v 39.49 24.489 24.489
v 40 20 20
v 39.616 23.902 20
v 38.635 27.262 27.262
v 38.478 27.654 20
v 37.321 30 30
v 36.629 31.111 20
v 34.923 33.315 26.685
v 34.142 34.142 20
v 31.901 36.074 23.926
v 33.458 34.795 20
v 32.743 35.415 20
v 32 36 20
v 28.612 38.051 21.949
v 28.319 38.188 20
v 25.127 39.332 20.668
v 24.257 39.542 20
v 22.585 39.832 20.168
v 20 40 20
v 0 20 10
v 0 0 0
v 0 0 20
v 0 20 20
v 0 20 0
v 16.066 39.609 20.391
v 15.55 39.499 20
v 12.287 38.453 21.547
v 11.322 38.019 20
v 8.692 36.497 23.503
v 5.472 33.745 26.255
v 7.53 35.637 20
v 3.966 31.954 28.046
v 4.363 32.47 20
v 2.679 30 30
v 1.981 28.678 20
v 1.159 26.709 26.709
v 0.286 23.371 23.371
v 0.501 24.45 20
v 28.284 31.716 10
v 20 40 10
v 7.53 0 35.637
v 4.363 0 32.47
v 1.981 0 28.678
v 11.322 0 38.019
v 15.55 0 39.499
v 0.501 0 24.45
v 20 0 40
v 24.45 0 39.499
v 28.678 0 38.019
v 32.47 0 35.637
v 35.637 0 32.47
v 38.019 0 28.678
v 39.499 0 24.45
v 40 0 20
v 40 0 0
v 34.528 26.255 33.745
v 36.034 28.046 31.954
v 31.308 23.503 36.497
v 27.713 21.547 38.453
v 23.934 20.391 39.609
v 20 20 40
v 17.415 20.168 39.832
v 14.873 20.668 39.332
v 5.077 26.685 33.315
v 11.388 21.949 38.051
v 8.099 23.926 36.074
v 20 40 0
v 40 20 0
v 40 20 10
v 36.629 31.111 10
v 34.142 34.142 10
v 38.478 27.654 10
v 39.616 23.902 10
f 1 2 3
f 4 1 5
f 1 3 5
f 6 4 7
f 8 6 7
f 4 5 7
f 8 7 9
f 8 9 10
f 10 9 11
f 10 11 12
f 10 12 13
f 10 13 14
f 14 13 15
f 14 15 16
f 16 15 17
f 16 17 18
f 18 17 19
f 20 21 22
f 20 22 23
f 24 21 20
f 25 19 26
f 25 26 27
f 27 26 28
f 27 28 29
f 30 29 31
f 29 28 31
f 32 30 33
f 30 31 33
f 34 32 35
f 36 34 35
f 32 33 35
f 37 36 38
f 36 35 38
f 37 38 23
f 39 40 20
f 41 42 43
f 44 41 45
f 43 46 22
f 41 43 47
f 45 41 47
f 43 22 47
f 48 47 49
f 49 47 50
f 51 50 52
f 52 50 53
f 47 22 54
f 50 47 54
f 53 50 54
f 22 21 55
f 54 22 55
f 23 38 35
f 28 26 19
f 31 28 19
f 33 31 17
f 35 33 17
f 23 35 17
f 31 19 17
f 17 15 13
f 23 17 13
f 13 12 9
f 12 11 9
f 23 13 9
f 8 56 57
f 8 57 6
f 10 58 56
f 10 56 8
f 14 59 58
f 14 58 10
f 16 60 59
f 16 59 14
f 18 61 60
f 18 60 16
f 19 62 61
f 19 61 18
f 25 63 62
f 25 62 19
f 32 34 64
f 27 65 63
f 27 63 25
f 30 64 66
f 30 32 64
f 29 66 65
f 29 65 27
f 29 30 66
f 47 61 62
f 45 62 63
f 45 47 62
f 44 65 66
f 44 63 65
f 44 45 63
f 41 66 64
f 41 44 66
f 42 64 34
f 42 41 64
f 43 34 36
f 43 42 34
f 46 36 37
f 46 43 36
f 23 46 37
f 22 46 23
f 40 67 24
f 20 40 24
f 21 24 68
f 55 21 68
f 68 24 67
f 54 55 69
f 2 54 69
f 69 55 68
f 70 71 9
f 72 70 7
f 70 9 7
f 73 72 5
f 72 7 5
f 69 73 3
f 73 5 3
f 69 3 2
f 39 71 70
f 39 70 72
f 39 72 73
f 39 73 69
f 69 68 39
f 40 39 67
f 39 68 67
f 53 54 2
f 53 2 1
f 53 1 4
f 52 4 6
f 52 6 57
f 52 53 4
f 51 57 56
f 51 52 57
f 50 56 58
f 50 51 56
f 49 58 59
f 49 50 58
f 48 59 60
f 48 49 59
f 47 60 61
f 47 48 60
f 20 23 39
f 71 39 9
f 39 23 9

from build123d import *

# Parameters (mm, degrees)
SKETCH1_W           = 40
SKETCH1_H           = 20
BOSS_EXTRUDE1_DEPTH = 40
CUT_EXTRUDE1_DEPTH  = 40
CUT_EXTRUDE2_DEPTH  = 40
CUT_EXTRUDE3_DEPTH  = 10
CUT_EXTRUDE4_DEPTH  = 10
BOSS_EXTRUDE2_DEPTH = 10


with BuildPart() as part:
    # Sketch1 → Boss-Extrude1 (new body)
    with BuildSketch(Plane.XY):
        with BuildLine():
            Line((0, 20), (40, 20))
            ThreePointArc((40, 20), (20, 40), (0, 20))
        make_face()
        with Locations((20, 10)):
            Rectangle(SKETCH1_W, SKETCH1_H)
    extrude(amount=BOSS_EXTRUDE1_DEPTH)

    # Sketch2 → Cut-Extrude1 (cut)
    with BuildSketch(Plane(origin=(0, 0, 0), x_dir=(1, 0, 0), z_dir=(0, 1, 0))):
        with BuildLine():
            Line((0, -20), (0, -40))
            Line((0, -40), (20, -40))
            ThreePointArc((20, -40), (5.857864, -34.142136), (0, -20))
        make_face()
        with BuildLine():
            ThreePointArc((40, -20), (34.142136, -34.142136), (20, -40))
            Line((20, -40), (40, -40))
            Line((40, -40), (40, -20))
        make_face()
    extrude(amount=CUT_EXTRUDE1_DEPTH, mode=Mode.SUBTRACT)

    # Sketch3 → Cut-Extrude2 (cut)
    with BuildSketch(Plane(origin=(0, 0, 0), x_dir=(0, 0, -1), z_dir=(1, 0, 0))):
        Polygon((-40, 20), (-20, 40), (-40, 40), align=None)
    extrude(amount=CUT_EXTRUDE2_DEPTH, mode=Mode.SUBTRACT)

    # Sketch4 → Cut-Extrude3 (cut)
    with BuildSketch(Plane(origin=(0, 0, 0), x_dir=(-1, 0, 0), z_dir=(0, 0, -1))):
        with BuildLine():
            Line((-40, 20), (-20, 40))
            ThreePointArc((-20, 40), (-34.142136, 34.142136), (-40, 20))
        make_face()
        with BuildLine():
            ThreePointArc((0, 20), (-5.857864, 34.142136), (-20, 40))
            Line((-20, 40), (0, 20))
        make_face()
    extrude(amount=-CUT_EXTRUDE3_DEPTH, mode=Mode.SUBTRACT)

    # Sketch5 → Cut-Extrude4 (cut)
    with BuildSketch(Plane.XY.offset(10)):
        Polygon((40, 20), (40, 40), (0, 20), align=None)
        with BuildLine():
            ThreePointArc((32, 36), (11.055728, 37.888544), (0, 20))
            Line((0, 20), (32, 36))
        make_face()
    extrude(amount=CUT_EXTRUDE4_DEPTH, mode=Mode.SUBTRACT)

    # Sketch7 → Boss-Extrude2 (add)
    with BuildSketch(Plane(origin=(0, 0, 20), x_dir=(-1, 0, 0), z_dir=(0, 0, -1))):
        with BuildLine():
            Line((0, 20), (-34.142136, 34.142136))
            ThreePointArc((-34.142136, 34.142136), (-38.477591, 27.653669), (-40, 20))
            Line((-40, 20), (0, 20))
        make_face()
    extrude(amount=BOSS_EXTRUDE2_DEPTH)


solid = part.part
